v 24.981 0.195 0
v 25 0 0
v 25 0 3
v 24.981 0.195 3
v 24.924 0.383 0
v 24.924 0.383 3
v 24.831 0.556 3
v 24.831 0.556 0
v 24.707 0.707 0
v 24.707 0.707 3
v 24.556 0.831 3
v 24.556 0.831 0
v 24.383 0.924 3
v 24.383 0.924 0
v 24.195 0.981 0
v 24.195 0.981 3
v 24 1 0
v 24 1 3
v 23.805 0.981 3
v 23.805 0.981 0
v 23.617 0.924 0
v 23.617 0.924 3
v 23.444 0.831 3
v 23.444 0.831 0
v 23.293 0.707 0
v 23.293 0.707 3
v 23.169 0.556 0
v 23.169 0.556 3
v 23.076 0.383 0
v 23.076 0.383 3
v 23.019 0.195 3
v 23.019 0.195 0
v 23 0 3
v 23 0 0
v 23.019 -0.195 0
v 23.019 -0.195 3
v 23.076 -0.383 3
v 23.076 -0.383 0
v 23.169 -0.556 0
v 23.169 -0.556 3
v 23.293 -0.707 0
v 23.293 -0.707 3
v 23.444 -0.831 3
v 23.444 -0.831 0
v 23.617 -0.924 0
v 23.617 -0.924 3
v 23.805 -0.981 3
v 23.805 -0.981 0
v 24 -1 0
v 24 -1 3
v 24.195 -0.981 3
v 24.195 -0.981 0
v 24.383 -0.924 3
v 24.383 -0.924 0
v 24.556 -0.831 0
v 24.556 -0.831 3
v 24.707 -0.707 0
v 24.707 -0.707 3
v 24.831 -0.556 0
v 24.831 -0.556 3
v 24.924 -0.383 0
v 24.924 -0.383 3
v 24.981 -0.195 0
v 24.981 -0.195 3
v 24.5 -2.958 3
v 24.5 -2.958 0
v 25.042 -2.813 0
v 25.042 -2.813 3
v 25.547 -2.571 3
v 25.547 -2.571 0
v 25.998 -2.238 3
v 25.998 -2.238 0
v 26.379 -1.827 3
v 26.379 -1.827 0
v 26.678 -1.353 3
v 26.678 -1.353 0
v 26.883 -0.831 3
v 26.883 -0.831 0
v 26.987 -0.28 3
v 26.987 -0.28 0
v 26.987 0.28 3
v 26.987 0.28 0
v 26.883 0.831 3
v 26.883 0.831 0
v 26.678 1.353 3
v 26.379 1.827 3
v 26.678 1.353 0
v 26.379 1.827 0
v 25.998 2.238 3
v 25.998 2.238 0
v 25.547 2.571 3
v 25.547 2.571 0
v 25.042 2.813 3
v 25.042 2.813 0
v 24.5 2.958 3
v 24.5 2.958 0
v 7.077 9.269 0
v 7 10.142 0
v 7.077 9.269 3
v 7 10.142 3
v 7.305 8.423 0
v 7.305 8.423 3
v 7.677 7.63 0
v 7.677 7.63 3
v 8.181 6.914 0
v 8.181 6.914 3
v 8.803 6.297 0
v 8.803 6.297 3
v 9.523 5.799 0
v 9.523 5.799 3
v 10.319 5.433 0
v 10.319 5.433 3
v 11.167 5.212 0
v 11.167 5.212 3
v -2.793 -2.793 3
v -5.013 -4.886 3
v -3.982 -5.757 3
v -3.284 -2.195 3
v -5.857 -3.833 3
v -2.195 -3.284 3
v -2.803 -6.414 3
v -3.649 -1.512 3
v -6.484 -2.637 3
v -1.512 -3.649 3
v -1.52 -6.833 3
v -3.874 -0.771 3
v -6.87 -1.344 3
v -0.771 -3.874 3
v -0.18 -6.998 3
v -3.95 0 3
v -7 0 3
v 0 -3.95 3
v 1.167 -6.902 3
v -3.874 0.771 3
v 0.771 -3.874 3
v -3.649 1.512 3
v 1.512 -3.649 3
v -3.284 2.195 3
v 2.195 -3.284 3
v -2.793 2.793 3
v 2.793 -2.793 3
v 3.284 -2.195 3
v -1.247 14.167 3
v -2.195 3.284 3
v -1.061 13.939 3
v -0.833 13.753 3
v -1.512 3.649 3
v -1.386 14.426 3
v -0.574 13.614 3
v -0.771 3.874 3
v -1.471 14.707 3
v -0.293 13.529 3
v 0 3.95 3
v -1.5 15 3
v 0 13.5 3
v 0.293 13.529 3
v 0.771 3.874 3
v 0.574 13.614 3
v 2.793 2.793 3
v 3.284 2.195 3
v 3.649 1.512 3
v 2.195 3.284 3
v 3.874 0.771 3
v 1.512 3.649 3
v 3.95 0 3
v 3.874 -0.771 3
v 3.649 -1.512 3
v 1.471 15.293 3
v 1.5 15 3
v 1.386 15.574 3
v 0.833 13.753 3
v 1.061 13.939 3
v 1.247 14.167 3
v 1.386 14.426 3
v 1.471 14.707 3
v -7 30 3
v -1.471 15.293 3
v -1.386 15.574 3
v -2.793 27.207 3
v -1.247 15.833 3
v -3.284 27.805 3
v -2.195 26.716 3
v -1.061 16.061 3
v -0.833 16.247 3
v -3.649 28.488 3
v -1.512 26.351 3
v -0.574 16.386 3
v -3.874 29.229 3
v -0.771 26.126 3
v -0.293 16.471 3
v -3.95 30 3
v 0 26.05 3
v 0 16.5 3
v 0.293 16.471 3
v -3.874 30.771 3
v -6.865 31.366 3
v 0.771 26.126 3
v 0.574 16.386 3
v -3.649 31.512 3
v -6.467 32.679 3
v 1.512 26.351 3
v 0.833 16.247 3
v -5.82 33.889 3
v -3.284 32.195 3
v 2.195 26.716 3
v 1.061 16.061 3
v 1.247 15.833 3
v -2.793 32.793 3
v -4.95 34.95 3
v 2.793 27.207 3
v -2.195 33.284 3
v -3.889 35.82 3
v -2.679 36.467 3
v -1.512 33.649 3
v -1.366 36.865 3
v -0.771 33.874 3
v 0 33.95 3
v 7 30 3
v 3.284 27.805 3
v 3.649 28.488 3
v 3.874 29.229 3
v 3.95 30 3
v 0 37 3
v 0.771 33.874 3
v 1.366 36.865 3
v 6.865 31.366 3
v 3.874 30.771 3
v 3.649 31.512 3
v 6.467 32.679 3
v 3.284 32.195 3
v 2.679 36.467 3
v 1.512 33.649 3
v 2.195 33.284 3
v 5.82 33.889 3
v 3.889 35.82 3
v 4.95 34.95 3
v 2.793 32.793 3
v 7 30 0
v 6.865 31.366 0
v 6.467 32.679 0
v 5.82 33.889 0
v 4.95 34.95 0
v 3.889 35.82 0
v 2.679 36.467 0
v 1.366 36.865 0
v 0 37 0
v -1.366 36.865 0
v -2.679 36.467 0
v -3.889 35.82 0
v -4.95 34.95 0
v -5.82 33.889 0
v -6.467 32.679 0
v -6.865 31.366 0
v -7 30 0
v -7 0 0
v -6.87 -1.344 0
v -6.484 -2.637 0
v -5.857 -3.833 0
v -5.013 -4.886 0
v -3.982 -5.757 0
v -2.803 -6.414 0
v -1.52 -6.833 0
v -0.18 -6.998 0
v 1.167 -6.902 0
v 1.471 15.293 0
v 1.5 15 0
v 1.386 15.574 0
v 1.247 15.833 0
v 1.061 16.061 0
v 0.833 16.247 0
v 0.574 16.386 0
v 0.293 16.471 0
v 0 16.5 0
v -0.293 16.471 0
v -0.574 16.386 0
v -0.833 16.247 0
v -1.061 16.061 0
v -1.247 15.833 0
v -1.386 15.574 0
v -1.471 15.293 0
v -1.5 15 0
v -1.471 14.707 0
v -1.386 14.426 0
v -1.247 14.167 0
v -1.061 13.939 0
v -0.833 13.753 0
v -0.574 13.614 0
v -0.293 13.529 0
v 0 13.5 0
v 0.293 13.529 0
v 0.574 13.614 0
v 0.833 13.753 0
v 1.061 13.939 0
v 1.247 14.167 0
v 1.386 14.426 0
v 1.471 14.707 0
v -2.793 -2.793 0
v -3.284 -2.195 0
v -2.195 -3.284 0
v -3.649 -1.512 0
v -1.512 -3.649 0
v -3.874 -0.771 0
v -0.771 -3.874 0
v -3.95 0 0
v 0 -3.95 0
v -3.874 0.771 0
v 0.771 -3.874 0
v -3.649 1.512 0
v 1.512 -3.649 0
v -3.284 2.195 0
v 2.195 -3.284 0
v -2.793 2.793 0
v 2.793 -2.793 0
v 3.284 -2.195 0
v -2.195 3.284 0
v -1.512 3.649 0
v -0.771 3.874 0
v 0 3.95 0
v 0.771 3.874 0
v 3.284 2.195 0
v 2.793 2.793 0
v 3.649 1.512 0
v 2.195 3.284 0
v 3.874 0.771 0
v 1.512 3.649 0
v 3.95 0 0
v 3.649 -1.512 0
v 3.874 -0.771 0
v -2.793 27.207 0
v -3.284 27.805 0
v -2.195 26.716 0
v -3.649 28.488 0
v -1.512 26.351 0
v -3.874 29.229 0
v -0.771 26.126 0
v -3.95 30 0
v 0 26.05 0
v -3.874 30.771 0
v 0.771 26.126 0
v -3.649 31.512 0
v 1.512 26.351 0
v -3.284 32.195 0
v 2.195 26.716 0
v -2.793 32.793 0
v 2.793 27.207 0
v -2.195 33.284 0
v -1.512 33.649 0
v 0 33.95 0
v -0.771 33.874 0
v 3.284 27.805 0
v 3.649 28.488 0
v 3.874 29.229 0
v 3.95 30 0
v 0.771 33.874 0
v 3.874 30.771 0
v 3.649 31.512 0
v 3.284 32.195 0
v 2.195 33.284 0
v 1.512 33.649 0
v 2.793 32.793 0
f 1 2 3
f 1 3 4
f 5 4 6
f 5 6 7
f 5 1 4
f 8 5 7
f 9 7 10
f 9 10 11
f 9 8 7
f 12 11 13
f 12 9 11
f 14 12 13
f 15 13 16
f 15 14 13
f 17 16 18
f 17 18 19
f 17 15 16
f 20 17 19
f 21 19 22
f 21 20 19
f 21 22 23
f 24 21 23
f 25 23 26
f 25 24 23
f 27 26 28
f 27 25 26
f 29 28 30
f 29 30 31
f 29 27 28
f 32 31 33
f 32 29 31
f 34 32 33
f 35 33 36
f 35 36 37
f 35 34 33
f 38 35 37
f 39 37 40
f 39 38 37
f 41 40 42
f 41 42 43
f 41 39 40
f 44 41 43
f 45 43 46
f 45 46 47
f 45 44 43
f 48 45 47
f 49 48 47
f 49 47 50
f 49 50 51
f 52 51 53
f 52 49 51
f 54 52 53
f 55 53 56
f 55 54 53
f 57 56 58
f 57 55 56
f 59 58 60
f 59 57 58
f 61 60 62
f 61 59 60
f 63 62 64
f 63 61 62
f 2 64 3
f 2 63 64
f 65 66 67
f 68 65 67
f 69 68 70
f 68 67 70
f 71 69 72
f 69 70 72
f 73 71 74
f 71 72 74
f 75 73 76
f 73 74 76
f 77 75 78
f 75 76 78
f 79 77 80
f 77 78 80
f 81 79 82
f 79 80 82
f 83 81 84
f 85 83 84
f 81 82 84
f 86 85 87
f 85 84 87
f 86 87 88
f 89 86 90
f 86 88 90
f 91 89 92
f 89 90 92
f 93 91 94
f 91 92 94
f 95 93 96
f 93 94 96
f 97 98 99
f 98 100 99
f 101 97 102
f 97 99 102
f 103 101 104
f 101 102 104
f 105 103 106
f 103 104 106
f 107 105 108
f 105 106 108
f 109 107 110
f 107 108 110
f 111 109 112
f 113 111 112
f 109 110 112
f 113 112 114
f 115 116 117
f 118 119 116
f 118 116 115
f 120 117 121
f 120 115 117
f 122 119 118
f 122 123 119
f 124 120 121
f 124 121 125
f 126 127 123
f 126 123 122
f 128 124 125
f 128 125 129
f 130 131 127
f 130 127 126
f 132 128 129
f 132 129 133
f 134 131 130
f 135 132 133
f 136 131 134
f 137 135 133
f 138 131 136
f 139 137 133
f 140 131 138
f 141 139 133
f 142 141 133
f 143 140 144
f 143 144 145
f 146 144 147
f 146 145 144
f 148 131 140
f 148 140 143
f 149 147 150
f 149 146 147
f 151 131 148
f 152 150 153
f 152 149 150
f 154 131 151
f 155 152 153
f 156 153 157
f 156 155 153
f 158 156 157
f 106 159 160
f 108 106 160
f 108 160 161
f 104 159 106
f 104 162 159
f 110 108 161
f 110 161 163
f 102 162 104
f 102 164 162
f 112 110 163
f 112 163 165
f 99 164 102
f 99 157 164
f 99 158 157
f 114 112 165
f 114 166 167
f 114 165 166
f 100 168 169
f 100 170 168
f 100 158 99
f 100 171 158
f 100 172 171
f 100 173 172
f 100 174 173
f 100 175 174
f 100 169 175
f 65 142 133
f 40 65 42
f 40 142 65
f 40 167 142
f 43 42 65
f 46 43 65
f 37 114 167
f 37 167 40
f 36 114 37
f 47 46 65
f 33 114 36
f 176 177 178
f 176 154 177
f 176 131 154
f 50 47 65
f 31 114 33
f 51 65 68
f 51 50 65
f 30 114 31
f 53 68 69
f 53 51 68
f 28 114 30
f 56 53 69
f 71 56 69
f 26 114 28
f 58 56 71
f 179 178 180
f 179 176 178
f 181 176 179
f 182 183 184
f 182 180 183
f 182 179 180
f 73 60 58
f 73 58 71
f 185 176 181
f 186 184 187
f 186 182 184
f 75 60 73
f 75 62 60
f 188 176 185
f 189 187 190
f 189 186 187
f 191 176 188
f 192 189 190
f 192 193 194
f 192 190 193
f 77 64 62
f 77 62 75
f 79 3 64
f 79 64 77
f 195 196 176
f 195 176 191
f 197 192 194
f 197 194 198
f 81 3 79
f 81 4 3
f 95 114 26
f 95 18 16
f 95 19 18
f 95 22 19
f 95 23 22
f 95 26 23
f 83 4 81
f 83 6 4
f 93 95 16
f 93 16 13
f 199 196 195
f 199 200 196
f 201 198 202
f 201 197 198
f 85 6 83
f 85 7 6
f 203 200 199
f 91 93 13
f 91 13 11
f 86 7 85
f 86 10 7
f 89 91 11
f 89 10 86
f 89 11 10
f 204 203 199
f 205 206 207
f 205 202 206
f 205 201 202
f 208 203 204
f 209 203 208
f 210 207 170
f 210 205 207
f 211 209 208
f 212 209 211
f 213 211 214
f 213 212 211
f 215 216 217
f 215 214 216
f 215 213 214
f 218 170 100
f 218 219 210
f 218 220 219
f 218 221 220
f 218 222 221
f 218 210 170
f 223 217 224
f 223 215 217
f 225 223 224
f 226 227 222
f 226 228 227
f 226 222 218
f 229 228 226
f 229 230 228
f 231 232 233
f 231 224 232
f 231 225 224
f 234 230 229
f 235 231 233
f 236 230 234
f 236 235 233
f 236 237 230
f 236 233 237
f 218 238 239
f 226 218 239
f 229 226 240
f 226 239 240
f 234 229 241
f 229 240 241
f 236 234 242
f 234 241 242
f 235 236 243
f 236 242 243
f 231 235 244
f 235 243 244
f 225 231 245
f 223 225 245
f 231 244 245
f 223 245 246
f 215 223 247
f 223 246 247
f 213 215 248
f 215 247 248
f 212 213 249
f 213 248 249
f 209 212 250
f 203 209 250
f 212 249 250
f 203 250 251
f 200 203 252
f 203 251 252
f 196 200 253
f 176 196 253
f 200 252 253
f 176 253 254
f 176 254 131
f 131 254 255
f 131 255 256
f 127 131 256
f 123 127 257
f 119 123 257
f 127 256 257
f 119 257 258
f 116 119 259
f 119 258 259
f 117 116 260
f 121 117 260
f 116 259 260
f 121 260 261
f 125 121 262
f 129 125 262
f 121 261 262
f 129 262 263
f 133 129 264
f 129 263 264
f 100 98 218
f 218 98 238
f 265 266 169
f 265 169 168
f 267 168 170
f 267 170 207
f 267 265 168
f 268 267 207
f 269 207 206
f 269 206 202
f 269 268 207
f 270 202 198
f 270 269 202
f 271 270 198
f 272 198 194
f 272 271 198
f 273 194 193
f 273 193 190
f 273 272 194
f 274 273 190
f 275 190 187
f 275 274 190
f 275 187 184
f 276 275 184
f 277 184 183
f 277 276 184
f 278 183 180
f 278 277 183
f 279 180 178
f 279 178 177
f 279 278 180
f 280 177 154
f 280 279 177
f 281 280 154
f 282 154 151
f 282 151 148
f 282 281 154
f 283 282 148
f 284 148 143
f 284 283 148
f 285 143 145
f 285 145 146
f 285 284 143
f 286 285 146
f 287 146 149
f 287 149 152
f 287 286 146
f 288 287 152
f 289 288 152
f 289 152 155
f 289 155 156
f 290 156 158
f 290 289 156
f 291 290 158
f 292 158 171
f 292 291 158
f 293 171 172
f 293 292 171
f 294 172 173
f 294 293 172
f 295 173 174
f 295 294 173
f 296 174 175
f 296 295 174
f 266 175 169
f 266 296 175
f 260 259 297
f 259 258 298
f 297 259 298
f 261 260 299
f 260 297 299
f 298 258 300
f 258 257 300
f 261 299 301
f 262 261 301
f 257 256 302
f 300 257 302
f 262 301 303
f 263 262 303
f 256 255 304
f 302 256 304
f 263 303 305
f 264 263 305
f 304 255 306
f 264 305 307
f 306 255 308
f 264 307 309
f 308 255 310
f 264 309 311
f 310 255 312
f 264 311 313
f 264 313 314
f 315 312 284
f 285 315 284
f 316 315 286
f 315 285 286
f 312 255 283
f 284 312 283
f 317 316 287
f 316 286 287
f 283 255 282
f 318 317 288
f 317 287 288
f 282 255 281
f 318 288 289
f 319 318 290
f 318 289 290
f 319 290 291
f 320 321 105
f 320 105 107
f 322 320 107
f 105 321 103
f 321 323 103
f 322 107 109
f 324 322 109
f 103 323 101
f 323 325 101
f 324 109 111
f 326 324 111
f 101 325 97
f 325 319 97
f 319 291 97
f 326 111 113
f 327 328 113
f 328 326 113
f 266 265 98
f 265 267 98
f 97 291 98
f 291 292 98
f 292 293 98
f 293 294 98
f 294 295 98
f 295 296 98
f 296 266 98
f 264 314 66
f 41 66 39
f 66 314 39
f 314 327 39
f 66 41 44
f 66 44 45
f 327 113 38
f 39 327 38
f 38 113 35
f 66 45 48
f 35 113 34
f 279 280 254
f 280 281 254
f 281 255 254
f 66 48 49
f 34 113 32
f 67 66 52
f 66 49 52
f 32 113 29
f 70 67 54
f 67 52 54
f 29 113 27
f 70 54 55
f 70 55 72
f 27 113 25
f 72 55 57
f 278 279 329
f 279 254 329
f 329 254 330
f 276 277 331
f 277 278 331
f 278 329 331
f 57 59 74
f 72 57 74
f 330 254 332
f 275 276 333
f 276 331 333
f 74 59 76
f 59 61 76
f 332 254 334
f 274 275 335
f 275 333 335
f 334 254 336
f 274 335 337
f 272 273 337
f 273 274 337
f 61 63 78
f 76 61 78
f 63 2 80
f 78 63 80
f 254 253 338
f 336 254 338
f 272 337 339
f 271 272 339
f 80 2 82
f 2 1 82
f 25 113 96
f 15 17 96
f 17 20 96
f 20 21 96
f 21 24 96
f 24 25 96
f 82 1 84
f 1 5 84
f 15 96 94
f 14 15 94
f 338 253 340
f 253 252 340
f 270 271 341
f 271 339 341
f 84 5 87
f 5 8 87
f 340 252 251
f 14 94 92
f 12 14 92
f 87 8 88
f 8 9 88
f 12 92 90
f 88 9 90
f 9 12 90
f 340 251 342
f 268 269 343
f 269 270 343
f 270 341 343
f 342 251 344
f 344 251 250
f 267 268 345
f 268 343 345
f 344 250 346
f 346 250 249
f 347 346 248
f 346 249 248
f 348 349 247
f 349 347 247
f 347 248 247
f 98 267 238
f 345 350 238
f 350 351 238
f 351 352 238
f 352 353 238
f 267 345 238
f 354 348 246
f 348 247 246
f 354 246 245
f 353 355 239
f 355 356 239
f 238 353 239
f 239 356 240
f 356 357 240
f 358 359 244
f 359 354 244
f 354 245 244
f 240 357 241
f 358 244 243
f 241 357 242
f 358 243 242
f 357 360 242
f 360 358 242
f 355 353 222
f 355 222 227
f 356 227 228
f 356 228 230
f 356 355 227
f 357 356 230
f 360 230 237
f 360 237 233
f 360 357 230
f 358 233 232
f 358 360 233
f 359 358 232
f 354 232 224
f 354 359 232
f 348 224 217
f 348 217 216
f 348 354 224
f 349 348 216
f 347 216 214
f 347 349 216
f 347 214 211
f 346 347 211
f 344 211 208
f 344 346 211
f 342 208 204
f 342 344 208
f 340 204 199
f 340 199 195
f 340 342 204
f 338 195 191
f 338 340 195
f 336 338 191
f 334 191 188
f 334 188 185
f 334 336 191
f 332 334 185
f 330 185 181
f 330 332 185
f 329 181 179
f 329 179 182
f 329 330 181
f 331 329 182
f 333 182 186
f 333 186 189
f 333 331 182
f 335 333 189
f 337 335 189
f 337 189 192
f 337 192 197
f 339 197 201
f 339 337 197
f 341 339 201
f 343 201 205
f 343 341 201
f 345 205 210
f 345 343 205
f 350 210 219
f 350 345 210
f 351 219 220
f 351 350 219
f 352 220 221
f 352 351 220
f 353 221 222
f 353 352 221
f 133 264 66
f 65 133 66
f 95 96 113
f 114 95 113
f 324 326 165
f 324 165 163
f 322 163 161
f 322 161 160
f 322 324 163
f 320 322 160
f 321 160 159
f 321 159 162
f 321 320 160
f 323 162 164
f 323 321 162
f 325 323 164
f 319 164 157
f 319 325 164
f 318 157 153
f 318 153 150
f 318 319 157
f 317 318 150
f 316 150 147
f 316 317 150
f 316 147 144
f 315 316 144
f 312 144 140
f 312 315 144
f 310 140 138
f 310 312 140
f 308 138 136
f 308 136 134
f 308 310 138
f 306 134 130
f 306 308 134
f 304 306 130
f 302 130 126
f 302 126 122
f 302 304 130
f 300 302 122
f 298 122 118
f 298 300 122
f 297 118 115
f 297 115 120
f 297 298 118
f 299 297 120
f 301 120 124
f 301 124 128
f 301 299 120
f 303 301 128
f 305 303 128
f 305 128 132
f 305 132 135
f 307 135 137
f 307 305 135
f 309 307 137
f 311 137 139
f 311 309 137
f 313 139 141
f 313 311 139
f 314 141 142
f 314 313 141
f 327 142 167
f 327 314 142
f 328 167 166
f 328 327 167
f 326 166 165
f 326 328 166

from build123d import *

# Parameters (mm, degrees)
SKETCH_1_R      = 3.95
SKETCH_1_R_2    = 1.5
SKETCH_1_R_3    = 1
EXTRUDE_1_DEPTH = 3
FILLET_1_R      = 5


with BuildPart() as part:
    # 草图1 → 凸台-拉伸1 (new body)
    with BuildSketch(Plane.XY):
        with BuildLine():
            Line((7, 5.916079783), (7, 30))
            ThreePointArc((7, 30), (0, 37), (-7, 30))
            Line((-7, 30), (-7, 0))
            ThreePointArc((-7, 0), (-4.518480571, -5.346338311), (1.166666667, -6.90209308))
            Line((1.166666667, -6.90209308), (24.5, -2.958039892))
            ThreePointArc((24.5, -2.958039892), (27, 0), (24.5, 2.958039892))
            Line((24.5, 2.958039892), (7, 5.916079783))
        make_face()
        Circle(SKETCH_1_R, mode=Mode.SUBTRACT)
        with Locations((0, 15)):
            Circle(SKETCH_1_R_2, mode=Mode.SUBTRACT)
        with Locations((0, 30)):
            Circle(SKETCH_1_R, mode=Mode.SUBTRACT)
        with Locations((24, 0)):
            Circle(SKETCH_1_R_3, mode=Mode.SUBTRACT)
    extrude(amount=EXTRUDE_1_DEPTH)

    # 圆角1
    fillet_1_edges = [part.edges().sort_by_distance(p)[0] for p in [
        (7, 5.916079783, 1.5),
    ]]
    fillet(fillet_1_edges, radius=FILLET_1_R)


solid = part.part
